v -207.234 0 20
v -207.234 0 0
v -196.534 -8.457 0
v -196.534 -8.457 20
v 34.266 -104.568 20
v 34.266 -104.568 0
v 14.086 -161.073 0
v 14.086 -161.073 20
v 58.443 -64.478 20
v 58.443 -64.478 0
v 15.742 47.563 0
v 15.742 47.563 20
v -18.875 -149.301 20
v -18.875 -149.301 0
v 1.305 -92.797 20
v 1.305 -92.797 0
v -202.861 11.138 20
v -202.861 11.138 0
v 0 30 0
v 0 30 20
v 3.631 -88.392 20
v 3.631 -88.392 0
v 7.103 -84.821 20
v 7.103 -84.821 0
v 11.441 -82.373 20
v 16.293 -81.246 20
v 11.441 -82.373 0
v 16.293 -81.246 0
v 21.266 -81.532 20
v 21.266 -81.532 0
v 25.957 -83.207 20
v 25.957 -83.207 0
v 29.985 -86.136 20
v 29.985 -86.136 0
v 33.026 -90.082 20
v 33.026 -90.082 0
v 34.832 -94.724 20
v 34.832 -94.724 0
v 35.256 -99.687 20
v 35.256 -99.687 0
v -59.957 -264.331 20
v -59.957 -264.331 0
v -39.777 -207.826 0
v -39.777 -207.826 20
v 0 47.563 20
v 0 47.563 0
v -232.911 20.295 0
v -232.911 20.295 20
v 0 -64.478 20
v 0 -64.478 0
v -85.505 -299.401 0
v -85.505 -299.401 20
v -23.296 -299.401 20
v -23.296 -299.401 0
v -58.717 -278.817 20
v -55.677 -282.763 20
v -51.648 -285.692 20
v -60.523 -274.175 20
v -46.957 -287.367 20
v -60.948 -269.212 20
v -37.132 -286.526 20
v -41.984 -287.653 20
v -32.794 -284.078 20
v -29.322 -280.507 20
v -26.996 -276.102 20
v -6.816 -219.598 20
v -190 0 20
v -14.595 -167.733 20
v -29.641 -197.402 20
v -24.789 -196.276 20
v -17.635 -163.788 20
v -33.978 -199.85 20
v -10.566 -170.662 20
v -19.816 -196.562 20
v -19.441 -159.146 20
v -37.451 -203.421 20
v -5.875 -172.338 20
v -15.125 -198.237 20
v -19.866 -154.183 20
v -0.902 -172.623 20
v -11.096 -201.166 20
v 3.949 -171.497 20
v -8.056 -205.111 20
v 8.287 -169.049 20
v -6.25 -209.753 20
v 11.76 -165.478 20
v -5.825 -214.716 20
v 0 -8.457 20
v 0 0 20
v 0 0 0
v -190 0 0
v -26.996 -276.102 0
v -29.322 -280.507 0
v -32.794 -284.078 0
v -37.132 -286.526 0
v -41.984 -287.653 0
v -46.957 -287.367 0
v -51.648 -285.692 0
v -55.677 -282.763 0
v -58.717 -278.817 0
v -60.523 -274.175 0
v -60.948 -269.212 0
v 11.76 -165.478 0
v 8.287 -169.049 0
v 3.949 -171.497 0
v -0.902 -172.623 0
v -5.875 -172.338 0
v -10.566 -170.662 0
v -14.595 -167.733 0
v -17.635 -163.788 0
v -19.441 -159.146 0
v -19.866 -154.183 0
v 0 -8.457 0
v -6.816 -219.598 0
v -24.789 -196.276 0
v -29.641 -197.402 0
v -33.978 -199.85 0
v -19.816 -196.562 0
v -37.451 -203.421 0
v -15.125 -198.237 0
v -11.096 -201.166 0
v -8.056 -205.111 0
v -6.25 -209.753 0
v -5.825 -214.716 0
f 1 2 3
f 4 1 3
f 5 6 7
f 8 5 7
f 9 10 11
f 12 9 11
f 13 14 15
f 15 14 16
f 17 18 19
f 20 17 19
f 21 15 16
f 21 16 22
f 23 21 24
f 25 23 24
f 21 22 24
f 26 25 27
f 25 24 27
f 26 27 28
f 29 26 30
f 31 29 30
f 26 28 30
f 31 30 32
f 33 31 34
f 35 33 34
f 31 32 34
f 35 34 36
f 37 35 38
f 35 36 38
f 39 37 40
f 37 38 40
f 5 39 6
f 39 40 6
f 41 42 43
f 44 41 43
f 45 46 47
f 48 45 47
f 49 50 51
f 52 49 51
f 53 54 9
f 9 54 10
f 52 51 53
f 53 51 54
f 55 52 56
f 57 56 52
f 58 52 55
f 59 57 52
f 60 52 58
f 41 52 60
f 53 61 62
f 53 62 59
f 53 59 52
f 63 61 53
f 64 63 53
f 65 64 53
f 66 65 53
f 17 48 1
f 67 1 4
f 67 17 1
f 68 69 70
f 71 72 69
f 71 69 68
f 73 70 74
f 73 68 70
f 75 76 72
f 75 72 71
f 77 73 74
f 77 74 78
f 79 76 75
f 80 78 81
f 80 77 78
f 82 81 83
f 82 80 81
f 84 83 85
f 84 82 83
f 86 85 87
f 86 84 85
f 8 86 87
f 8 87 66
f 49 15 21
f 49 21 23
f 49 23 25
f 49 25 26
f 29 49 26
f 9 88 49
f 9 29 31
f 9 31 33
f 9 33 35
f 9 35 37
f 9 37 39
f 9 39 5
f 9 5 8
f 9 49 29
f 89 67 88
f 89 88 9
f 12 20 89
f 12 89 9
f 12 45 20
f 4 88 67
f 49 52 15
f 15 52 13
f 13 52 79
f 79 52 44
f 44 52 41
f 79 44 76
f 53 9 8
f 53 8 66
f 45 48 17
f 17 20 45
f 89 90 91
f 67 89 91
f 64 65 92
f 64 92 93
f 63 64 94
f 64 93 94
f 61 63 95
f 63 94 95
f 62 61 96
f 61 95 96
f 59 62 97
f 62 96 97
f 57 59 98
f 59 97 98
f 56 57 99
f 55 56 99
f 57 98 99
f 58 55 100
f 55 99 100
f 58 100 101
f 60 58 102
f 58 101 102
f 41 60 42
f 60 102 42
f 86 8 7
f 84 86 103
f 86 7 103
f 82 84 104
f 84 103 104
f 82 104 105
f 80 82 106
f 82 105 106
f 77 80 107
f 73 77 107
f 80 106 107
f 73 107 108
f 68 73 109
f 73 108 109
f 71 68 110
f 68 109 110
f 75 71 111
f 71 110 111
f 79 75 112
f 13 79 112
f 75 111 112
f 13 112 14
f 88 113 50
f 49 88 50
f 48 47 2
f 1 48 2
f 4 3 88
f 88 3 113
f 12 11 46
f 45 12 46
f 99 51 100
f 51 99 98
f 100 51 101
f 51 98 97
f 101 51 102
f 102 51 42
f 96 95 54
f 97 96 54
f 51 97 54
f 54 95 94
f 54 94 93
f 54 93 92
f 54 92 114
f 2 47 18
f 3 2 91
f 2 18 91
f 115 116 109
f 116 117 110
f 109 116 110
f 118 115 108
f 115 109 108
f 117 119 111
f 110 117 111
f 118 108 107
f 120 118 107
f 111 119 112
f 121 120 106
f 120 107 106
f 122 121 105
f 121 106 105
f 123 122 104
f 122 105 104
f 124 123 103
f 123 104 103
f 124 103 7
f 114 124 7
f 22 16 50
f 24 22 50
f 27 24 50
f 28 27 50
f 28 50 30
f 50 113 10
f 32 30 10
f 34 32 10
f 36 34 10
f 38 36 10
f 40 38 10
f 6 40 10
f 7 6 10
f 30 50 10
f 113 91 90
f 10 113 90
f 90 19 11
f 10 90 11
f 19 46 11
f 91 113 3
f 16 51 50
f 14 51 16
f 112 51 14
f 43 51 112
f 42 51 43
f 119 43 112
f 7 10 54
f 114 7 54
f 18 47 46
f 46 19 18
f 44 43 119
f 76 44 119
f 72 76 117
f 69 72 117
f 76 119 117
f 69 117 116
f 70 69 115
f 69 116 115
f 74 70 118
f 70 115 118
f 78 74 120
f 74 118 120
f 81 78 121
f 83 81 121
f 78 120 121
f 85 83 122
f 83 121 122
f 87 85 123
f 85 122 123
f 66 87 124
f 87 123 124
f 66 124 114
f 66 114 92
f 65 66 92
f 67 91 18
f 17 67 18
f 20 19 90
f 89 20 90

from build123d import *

# Parameters (mm, degrees)
BOSS_EXTRU_1_DEPTH = 20


with BuildPart() as part:
    # Esquisse1 → Boss.-Extru.1 (new body)
    with BuildSketch(Plane.XY):
        Polygon((-196.533735711, -8.457408384), (0, -8.457408384), (0, -64.477749577), (-85.505035831, -299.400904773), (-68.158030406, -299.400904773), (-23.296347582, -299.400904773), (58.442642683, -64.477749577), (15.742456943, 47.56293281), (0, 47.56293281), (-232.911164776, 20.29498163), (-207.234020919, 0), align=None)
        with BuildLine():
            ThreePointArc((-39.776845244, -207.826148347), (-17.410500422, -197.231497844), (-6.815849919, -219.597842666))
            Line((-6.815849919, -219.597842666), (-26.995897322, -276.102406082))
            ThreePointArc((-26.995897322, -276.102406082), (-49.362242144, -286.697056585), (-59.956892648, -264.330711763))
            Line((-59.956892648, -264.330711763), (-39.776845244, -207.826148347))
        make_face(mode=Mode.SUBTRACT)
        with BuildLine():
            ThreePointArc((1.304768326, -92.796753577), (23.671113149, -82.202103073), (34.265763652, -104.568447895))
            Line((34.265763652, -104.568447895), (14.085716249, -161.073011311))
            ThreePointArc((14.085716249, -161.073011311), (-8.280628573, -171.667661815), (-18.875279077, -149.301316992))
            Line((-18.875279077, -149.301316992), (1.304768326, -92.796753577))
        make_face(mode=Mode.SUBTRACT)
        Polygon((0, 30), (0, 0), (-190, 0), (-202.86096767, 11.137722401), align=None, mode=Mode.SUBTRACT)
    extrude(amount=BOSS_EXTRU_1_DEPTH)


solid = part.part
